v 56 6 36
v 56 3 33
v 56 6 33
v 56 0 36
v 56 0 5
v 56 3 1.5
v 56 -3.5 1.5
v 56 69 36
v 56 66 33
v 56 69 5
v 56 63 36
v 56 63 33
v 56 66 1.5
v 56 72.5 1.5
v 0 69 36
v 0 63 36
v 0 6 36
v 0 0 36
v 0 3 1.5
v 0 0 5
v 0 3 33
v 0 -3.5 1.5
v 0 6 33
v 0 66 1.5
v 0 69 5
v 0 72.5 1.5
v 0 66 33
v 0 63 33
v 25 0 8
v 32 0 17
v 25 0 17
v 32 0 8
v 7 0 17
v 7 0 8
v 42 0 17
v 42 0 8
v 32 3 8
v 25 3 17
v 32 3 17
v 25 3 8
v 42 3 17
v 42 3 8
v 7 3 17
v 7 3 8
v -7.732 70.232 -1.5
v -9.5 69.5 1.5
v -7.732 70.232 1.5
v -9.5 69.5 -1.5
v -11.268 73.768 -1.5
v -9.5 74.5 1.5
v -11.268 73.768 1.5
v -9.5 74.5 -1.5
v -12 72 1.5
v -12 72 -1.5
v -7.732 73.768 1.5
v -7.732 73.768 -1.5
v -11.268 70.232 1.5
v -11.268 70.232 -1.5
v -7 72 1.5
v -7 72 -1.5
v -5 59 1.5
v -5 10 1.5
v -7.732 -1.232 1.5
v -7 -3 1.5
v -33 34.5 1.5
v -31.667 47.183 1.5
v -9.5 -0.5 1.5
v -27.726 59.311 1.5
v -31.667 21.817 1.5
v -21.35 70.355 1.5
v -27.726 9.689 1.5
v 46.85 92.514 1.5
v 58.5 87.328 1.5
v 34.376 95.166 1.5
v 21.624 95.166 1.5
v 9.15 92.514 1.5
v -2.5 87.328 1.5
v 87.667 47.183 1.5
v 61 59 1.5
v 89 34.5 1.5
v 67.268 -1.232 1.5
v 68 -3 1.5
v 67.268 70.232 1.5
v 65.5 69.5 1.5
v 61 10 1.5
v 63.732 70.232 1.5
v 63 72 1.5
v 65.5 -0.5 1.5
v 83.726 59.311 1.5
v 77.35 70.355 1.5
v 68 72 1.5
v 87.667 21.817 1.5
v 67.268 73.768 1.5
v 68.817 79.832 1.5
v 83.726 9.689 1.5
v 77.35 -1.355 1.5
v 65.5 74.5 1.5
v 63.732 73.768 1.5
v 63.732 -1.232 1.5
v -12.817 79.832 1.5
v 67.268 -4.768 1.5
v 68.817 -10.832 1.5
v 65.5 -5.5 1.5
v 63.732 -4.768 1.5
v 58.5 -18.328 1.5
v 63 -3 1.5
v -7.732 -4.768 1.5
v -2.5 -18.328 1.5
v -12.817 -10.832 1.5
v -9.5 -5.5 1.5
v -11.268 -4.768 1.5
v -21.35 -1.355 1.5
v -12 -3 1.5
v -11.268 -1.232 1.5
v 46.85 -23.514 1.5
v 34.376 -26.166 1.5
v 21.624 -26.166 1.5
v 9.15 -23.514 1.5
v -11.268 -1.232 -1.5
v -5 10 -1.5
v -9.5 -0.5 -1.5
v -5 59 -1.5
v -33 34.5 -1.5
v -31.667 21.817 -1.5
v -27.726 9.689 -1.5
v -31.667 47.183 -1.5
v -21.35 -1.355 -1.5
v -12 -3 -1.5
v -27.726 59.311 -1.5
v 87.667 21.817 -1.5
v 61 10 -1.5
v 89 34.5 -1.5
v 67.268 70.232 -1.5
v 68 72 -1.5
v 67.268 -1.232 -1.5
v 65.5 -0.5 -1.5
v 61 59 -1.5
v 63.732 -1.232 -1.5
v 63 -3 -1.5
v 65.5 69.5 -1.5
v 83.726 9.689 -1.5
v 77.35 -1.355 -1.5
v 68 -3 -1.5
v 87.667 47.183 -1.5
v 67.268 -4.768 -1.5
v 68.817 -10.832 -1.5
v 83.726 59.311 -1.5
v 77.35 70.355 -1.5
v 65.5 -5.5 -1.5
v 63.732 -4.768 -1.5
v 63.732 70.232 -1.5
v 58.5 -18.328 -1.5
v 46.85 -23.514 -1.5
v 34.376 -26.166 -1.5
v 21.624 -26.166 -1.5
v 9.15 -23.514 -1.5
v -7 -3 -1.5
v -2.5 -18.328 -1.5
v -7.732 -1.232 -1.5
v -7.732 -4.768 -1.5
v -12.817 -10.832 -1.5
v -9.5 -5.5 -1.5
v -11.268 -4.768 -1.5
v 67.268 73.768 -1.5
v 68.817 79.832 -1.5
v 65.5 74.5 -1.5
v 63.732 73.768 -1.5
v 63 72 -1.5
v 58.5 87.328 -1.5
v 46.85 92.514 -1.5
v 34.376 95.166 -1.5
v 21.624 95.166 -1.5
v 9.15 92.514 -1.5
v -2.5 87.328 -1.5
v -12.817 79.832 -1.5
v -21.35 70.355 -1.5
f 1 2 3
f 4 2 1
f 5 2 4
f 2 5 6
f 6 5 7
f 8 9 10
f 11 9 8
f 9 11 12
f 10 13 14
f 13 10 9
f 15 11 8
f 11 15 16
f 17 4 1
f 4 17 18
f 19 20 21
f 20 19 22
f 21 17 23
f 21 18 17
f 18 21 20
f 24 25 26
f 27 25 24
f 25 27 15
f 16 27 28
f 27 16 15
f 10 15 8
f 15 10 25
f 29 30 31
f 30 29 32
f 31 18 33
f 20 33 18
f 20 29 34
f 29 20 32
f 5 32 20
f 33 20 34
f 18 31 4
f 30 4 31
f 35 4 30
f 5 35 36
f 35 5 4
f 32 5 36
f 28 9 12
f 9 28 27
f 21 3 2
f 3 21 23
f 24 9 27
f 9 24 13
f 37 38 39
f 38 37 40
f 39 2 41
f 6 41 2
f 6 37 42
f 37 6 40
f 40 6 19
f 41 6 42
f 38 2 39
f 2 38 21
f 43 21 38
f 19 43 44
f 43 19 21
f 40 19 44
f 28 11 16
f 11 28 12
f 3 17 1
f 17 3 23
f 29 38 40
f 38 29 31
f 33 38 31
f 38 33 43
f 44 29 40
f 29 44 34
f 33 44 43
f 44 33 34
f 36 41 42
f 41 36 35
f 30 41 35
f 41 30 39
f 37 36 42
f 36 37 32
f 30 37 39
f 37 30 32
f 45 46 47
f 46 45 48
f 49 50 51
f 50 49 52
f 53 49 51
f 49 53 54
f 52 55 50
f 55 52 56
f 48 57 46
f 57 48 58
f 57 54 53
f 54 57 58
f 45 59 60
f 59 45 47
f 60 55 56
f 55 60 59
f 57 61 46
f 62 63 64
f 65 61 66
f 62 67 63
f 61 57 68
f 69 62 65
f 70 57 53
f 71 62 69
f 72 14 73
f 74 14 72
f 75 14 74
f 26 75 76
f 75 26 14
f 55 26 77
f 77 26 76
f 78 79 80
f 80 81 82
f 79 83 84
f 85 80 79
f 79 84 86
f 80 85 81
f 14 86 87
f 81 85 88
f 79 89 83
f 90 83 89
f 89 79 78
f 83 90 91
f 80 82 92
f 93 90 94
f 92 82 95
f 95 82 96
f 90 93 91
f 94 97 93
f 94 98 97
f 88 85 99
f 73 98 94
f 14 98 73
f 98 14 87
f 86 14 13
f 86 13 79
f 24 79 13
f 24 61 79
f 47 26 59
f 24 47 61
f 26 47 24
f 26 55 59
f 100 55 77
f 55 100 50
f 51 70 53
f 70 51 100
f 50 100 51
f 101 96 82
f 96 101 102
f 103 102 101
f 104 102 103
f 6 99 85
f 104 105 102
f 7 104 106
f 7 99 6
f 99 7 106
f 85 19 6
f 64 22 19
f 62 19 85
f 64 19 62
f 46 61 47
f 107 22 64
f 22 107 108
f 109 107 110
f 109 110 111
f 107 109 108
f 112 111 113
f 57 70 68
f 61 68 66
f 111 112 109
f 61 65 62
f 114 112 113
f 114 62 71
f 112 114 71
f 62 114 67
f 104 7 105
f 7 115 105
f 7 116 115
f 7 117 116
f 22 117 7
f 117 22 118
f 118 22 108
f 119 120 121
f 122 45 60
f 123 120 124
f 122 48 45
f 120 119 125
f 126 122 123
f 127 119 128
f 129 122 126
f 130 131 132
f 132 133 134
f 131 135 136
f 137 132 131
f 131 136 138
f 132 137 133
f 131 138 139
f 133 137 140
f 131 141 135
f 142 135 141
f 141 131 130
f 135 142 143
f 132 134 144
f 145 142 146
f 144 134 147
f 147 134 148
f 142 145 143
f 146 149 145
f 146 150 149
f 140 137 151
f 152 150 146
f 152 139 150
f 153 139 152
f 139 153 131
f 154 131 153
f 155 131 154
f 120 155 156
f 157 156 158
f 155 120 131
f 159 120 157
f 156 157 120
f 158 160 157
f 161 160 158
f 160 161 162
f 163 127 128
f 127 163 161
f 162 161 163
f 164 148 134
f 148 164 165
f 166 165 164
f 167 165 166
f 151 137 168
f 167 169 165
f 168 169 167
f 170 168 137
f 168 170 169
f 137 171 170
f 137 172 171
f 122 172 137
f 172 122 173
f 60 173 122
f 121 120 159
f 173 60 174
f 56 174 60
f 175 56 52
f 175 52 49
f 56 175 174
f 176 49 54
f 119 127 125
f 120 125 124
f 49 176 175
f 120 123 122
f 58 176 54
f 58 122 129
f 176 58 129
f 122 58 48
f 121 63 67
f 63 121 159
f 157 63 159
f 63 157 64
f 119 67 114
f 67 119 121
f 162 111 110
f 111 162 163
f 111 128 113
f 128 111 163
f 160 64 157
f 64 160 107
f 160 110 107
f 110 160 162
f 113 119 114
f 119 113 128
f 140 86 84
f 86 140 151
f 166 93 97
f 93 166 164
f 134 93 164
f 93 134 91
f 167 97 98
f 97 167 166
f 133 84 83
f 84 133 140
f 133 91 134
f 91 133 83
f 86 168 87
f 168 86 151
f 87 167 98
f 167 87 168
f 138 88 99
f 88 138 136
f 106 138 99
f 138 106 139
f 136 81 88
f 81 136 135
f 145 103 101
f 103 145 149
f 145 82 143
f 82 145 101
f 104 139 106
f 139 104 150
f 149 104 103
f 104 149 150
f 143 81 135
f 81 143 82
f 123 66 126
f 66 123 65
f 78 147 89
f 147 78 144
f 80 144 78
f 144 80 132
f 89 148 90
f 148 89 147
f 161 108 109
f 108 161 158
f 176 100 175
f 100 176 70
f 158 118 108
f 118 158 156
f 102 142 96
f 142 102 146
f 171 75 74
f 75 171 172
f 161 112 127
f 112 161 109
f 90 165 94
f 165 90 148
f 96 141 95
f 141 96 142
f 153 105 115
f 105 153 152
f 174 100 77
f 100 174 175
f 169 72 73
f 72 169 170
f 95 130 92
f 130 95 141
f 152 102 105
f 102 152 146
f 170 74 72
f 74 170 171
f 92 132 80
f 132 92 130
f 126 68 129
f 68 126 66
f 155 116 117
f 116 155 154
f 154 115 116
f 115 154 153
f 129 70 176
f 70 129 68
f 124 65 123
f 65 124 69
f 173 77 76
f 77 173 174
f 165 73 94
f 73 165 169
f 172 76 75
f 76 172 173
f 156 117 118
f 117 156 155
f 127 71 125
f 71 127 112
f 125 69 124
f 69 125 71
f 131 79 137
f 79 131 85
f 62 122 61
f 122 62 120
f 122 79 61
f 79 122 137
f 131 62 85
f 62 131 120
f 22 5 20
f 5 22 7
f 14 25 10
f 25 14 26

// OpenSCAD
/* [RaspberryPI holder] */
// Y dimension of the case i.e. SD side (HDMI+jack side is fixed to 56)
case_dimY = 63;
// Z dimension of the case
case_dimZ = 33;
// wall thickness
sp_raspPI = 3;

/* [Vesa base dimensions] */
// Vesa base thickness
sp_Vesa = 3;
// Vesa base diameter
dia_Vesa = 122;
// screw diameter
dia_viti = 5;
// X distance between screw
posX_viti = 75;
// Y distance between screw
posY_viti = 75;

/* [Other] */
// Hdmi & Jack lenght side
pareti_dimX = 56;
// External Y dimension
pareti_dimY = case_dimY + 2*sp_raspPI;
// External Z dimension
pareti_dimZ = case_dimZ + sp_raspPI;

module raspPI(){ // disegno pareti con alette superiori (box for raspberryPI - two L walls)
    difference(){
    cube([pareti_dimX,pareti_dimY,pareti_dimZ]);  // dimensioni esterne (external dimensions)  
    translate([0,sp_raspPI,0])cube([pareti_dimX,pareti_dimY-sp_raspPI*2,pareti_dimZ-sp_raspPI]); // vuoto per raspPI (hole for raspberryPI case)
    translate([0,sp_raspPI*2,0])cube([pareti_dimX,pareti_dimY-sp_raspPI*4,pareti_dimZ]); // vuoto per alette superiori (hole for raspberryPI case)
        }     
     }

module fori_porte(){ // dimensioni fori per porte HDMI e Jack (positioning and hole for hdmi and jack)
    union(){
        translate([7,0,8])cube([18,sp_raspPI,9]);
        translate([7+18+7,0,8])cube([10,sp_raspPI,9]);
        }
    
    }

module vite(){ // singola vite (one screw)
    cylinder(sp_Vesa, dia_viti/2, dia_viti/2);     
    }
    
module viti_Vesa(){ // fori per fissaggio Vesa (four holes for Vesa screw)
    translate([posX_viti/2,posY_viti/2,0])vite();
    mirror([0,1,0])translate([posX_viti/2,posY_viti/2,0])vite();
    mirror([1,0,0])union(){
    translate([posX_viti/2,posY_viti/2,0])vite();
    mirror([0,1,0])translate([posX_viti/2,posY_viti/2,0])vite();
    }
    }

module cuneo(){ //smusso (chamfer)
rotate([90,0,90])
linear_extrude(pareti_dimX)
polygon(points=[[0,0],[-5,0],[0,5]]);
}


module vuotopiastra(){ //vuoto rettangolare (hole in the middle of the base)
    cube([pareti_dimX+10,pareti_dimY-20,sp_Vesa],true);
    
    }

// MAIN

difference(){ // pareti forate (walls for raspberryPI with holes)
    raspPI();
    color("red")fori_porte();
    }
    

difference(){ //piastra Vesa forata (Vesa base with screw holes)
    translate([pareti_dimX/2,pareti_dimY/2,-sp_Vesa/2])cylinder(sp_Vesa,dia_Vesa/2,dia_Vesa/2); //piatto Vesa
    translate([pareti_dimX/2,pareti_dimY/2,-sp_Vesa/2])viti_Vesa();
    translate([pareti_dimX/2,pareti_dimY/2,0])vuotopiastra();
}

cuneo(); //rinforzo alla base (positioning chamfer)
translate([0,pareti_dimY,0])mirror([0,1,0])cuneo();
